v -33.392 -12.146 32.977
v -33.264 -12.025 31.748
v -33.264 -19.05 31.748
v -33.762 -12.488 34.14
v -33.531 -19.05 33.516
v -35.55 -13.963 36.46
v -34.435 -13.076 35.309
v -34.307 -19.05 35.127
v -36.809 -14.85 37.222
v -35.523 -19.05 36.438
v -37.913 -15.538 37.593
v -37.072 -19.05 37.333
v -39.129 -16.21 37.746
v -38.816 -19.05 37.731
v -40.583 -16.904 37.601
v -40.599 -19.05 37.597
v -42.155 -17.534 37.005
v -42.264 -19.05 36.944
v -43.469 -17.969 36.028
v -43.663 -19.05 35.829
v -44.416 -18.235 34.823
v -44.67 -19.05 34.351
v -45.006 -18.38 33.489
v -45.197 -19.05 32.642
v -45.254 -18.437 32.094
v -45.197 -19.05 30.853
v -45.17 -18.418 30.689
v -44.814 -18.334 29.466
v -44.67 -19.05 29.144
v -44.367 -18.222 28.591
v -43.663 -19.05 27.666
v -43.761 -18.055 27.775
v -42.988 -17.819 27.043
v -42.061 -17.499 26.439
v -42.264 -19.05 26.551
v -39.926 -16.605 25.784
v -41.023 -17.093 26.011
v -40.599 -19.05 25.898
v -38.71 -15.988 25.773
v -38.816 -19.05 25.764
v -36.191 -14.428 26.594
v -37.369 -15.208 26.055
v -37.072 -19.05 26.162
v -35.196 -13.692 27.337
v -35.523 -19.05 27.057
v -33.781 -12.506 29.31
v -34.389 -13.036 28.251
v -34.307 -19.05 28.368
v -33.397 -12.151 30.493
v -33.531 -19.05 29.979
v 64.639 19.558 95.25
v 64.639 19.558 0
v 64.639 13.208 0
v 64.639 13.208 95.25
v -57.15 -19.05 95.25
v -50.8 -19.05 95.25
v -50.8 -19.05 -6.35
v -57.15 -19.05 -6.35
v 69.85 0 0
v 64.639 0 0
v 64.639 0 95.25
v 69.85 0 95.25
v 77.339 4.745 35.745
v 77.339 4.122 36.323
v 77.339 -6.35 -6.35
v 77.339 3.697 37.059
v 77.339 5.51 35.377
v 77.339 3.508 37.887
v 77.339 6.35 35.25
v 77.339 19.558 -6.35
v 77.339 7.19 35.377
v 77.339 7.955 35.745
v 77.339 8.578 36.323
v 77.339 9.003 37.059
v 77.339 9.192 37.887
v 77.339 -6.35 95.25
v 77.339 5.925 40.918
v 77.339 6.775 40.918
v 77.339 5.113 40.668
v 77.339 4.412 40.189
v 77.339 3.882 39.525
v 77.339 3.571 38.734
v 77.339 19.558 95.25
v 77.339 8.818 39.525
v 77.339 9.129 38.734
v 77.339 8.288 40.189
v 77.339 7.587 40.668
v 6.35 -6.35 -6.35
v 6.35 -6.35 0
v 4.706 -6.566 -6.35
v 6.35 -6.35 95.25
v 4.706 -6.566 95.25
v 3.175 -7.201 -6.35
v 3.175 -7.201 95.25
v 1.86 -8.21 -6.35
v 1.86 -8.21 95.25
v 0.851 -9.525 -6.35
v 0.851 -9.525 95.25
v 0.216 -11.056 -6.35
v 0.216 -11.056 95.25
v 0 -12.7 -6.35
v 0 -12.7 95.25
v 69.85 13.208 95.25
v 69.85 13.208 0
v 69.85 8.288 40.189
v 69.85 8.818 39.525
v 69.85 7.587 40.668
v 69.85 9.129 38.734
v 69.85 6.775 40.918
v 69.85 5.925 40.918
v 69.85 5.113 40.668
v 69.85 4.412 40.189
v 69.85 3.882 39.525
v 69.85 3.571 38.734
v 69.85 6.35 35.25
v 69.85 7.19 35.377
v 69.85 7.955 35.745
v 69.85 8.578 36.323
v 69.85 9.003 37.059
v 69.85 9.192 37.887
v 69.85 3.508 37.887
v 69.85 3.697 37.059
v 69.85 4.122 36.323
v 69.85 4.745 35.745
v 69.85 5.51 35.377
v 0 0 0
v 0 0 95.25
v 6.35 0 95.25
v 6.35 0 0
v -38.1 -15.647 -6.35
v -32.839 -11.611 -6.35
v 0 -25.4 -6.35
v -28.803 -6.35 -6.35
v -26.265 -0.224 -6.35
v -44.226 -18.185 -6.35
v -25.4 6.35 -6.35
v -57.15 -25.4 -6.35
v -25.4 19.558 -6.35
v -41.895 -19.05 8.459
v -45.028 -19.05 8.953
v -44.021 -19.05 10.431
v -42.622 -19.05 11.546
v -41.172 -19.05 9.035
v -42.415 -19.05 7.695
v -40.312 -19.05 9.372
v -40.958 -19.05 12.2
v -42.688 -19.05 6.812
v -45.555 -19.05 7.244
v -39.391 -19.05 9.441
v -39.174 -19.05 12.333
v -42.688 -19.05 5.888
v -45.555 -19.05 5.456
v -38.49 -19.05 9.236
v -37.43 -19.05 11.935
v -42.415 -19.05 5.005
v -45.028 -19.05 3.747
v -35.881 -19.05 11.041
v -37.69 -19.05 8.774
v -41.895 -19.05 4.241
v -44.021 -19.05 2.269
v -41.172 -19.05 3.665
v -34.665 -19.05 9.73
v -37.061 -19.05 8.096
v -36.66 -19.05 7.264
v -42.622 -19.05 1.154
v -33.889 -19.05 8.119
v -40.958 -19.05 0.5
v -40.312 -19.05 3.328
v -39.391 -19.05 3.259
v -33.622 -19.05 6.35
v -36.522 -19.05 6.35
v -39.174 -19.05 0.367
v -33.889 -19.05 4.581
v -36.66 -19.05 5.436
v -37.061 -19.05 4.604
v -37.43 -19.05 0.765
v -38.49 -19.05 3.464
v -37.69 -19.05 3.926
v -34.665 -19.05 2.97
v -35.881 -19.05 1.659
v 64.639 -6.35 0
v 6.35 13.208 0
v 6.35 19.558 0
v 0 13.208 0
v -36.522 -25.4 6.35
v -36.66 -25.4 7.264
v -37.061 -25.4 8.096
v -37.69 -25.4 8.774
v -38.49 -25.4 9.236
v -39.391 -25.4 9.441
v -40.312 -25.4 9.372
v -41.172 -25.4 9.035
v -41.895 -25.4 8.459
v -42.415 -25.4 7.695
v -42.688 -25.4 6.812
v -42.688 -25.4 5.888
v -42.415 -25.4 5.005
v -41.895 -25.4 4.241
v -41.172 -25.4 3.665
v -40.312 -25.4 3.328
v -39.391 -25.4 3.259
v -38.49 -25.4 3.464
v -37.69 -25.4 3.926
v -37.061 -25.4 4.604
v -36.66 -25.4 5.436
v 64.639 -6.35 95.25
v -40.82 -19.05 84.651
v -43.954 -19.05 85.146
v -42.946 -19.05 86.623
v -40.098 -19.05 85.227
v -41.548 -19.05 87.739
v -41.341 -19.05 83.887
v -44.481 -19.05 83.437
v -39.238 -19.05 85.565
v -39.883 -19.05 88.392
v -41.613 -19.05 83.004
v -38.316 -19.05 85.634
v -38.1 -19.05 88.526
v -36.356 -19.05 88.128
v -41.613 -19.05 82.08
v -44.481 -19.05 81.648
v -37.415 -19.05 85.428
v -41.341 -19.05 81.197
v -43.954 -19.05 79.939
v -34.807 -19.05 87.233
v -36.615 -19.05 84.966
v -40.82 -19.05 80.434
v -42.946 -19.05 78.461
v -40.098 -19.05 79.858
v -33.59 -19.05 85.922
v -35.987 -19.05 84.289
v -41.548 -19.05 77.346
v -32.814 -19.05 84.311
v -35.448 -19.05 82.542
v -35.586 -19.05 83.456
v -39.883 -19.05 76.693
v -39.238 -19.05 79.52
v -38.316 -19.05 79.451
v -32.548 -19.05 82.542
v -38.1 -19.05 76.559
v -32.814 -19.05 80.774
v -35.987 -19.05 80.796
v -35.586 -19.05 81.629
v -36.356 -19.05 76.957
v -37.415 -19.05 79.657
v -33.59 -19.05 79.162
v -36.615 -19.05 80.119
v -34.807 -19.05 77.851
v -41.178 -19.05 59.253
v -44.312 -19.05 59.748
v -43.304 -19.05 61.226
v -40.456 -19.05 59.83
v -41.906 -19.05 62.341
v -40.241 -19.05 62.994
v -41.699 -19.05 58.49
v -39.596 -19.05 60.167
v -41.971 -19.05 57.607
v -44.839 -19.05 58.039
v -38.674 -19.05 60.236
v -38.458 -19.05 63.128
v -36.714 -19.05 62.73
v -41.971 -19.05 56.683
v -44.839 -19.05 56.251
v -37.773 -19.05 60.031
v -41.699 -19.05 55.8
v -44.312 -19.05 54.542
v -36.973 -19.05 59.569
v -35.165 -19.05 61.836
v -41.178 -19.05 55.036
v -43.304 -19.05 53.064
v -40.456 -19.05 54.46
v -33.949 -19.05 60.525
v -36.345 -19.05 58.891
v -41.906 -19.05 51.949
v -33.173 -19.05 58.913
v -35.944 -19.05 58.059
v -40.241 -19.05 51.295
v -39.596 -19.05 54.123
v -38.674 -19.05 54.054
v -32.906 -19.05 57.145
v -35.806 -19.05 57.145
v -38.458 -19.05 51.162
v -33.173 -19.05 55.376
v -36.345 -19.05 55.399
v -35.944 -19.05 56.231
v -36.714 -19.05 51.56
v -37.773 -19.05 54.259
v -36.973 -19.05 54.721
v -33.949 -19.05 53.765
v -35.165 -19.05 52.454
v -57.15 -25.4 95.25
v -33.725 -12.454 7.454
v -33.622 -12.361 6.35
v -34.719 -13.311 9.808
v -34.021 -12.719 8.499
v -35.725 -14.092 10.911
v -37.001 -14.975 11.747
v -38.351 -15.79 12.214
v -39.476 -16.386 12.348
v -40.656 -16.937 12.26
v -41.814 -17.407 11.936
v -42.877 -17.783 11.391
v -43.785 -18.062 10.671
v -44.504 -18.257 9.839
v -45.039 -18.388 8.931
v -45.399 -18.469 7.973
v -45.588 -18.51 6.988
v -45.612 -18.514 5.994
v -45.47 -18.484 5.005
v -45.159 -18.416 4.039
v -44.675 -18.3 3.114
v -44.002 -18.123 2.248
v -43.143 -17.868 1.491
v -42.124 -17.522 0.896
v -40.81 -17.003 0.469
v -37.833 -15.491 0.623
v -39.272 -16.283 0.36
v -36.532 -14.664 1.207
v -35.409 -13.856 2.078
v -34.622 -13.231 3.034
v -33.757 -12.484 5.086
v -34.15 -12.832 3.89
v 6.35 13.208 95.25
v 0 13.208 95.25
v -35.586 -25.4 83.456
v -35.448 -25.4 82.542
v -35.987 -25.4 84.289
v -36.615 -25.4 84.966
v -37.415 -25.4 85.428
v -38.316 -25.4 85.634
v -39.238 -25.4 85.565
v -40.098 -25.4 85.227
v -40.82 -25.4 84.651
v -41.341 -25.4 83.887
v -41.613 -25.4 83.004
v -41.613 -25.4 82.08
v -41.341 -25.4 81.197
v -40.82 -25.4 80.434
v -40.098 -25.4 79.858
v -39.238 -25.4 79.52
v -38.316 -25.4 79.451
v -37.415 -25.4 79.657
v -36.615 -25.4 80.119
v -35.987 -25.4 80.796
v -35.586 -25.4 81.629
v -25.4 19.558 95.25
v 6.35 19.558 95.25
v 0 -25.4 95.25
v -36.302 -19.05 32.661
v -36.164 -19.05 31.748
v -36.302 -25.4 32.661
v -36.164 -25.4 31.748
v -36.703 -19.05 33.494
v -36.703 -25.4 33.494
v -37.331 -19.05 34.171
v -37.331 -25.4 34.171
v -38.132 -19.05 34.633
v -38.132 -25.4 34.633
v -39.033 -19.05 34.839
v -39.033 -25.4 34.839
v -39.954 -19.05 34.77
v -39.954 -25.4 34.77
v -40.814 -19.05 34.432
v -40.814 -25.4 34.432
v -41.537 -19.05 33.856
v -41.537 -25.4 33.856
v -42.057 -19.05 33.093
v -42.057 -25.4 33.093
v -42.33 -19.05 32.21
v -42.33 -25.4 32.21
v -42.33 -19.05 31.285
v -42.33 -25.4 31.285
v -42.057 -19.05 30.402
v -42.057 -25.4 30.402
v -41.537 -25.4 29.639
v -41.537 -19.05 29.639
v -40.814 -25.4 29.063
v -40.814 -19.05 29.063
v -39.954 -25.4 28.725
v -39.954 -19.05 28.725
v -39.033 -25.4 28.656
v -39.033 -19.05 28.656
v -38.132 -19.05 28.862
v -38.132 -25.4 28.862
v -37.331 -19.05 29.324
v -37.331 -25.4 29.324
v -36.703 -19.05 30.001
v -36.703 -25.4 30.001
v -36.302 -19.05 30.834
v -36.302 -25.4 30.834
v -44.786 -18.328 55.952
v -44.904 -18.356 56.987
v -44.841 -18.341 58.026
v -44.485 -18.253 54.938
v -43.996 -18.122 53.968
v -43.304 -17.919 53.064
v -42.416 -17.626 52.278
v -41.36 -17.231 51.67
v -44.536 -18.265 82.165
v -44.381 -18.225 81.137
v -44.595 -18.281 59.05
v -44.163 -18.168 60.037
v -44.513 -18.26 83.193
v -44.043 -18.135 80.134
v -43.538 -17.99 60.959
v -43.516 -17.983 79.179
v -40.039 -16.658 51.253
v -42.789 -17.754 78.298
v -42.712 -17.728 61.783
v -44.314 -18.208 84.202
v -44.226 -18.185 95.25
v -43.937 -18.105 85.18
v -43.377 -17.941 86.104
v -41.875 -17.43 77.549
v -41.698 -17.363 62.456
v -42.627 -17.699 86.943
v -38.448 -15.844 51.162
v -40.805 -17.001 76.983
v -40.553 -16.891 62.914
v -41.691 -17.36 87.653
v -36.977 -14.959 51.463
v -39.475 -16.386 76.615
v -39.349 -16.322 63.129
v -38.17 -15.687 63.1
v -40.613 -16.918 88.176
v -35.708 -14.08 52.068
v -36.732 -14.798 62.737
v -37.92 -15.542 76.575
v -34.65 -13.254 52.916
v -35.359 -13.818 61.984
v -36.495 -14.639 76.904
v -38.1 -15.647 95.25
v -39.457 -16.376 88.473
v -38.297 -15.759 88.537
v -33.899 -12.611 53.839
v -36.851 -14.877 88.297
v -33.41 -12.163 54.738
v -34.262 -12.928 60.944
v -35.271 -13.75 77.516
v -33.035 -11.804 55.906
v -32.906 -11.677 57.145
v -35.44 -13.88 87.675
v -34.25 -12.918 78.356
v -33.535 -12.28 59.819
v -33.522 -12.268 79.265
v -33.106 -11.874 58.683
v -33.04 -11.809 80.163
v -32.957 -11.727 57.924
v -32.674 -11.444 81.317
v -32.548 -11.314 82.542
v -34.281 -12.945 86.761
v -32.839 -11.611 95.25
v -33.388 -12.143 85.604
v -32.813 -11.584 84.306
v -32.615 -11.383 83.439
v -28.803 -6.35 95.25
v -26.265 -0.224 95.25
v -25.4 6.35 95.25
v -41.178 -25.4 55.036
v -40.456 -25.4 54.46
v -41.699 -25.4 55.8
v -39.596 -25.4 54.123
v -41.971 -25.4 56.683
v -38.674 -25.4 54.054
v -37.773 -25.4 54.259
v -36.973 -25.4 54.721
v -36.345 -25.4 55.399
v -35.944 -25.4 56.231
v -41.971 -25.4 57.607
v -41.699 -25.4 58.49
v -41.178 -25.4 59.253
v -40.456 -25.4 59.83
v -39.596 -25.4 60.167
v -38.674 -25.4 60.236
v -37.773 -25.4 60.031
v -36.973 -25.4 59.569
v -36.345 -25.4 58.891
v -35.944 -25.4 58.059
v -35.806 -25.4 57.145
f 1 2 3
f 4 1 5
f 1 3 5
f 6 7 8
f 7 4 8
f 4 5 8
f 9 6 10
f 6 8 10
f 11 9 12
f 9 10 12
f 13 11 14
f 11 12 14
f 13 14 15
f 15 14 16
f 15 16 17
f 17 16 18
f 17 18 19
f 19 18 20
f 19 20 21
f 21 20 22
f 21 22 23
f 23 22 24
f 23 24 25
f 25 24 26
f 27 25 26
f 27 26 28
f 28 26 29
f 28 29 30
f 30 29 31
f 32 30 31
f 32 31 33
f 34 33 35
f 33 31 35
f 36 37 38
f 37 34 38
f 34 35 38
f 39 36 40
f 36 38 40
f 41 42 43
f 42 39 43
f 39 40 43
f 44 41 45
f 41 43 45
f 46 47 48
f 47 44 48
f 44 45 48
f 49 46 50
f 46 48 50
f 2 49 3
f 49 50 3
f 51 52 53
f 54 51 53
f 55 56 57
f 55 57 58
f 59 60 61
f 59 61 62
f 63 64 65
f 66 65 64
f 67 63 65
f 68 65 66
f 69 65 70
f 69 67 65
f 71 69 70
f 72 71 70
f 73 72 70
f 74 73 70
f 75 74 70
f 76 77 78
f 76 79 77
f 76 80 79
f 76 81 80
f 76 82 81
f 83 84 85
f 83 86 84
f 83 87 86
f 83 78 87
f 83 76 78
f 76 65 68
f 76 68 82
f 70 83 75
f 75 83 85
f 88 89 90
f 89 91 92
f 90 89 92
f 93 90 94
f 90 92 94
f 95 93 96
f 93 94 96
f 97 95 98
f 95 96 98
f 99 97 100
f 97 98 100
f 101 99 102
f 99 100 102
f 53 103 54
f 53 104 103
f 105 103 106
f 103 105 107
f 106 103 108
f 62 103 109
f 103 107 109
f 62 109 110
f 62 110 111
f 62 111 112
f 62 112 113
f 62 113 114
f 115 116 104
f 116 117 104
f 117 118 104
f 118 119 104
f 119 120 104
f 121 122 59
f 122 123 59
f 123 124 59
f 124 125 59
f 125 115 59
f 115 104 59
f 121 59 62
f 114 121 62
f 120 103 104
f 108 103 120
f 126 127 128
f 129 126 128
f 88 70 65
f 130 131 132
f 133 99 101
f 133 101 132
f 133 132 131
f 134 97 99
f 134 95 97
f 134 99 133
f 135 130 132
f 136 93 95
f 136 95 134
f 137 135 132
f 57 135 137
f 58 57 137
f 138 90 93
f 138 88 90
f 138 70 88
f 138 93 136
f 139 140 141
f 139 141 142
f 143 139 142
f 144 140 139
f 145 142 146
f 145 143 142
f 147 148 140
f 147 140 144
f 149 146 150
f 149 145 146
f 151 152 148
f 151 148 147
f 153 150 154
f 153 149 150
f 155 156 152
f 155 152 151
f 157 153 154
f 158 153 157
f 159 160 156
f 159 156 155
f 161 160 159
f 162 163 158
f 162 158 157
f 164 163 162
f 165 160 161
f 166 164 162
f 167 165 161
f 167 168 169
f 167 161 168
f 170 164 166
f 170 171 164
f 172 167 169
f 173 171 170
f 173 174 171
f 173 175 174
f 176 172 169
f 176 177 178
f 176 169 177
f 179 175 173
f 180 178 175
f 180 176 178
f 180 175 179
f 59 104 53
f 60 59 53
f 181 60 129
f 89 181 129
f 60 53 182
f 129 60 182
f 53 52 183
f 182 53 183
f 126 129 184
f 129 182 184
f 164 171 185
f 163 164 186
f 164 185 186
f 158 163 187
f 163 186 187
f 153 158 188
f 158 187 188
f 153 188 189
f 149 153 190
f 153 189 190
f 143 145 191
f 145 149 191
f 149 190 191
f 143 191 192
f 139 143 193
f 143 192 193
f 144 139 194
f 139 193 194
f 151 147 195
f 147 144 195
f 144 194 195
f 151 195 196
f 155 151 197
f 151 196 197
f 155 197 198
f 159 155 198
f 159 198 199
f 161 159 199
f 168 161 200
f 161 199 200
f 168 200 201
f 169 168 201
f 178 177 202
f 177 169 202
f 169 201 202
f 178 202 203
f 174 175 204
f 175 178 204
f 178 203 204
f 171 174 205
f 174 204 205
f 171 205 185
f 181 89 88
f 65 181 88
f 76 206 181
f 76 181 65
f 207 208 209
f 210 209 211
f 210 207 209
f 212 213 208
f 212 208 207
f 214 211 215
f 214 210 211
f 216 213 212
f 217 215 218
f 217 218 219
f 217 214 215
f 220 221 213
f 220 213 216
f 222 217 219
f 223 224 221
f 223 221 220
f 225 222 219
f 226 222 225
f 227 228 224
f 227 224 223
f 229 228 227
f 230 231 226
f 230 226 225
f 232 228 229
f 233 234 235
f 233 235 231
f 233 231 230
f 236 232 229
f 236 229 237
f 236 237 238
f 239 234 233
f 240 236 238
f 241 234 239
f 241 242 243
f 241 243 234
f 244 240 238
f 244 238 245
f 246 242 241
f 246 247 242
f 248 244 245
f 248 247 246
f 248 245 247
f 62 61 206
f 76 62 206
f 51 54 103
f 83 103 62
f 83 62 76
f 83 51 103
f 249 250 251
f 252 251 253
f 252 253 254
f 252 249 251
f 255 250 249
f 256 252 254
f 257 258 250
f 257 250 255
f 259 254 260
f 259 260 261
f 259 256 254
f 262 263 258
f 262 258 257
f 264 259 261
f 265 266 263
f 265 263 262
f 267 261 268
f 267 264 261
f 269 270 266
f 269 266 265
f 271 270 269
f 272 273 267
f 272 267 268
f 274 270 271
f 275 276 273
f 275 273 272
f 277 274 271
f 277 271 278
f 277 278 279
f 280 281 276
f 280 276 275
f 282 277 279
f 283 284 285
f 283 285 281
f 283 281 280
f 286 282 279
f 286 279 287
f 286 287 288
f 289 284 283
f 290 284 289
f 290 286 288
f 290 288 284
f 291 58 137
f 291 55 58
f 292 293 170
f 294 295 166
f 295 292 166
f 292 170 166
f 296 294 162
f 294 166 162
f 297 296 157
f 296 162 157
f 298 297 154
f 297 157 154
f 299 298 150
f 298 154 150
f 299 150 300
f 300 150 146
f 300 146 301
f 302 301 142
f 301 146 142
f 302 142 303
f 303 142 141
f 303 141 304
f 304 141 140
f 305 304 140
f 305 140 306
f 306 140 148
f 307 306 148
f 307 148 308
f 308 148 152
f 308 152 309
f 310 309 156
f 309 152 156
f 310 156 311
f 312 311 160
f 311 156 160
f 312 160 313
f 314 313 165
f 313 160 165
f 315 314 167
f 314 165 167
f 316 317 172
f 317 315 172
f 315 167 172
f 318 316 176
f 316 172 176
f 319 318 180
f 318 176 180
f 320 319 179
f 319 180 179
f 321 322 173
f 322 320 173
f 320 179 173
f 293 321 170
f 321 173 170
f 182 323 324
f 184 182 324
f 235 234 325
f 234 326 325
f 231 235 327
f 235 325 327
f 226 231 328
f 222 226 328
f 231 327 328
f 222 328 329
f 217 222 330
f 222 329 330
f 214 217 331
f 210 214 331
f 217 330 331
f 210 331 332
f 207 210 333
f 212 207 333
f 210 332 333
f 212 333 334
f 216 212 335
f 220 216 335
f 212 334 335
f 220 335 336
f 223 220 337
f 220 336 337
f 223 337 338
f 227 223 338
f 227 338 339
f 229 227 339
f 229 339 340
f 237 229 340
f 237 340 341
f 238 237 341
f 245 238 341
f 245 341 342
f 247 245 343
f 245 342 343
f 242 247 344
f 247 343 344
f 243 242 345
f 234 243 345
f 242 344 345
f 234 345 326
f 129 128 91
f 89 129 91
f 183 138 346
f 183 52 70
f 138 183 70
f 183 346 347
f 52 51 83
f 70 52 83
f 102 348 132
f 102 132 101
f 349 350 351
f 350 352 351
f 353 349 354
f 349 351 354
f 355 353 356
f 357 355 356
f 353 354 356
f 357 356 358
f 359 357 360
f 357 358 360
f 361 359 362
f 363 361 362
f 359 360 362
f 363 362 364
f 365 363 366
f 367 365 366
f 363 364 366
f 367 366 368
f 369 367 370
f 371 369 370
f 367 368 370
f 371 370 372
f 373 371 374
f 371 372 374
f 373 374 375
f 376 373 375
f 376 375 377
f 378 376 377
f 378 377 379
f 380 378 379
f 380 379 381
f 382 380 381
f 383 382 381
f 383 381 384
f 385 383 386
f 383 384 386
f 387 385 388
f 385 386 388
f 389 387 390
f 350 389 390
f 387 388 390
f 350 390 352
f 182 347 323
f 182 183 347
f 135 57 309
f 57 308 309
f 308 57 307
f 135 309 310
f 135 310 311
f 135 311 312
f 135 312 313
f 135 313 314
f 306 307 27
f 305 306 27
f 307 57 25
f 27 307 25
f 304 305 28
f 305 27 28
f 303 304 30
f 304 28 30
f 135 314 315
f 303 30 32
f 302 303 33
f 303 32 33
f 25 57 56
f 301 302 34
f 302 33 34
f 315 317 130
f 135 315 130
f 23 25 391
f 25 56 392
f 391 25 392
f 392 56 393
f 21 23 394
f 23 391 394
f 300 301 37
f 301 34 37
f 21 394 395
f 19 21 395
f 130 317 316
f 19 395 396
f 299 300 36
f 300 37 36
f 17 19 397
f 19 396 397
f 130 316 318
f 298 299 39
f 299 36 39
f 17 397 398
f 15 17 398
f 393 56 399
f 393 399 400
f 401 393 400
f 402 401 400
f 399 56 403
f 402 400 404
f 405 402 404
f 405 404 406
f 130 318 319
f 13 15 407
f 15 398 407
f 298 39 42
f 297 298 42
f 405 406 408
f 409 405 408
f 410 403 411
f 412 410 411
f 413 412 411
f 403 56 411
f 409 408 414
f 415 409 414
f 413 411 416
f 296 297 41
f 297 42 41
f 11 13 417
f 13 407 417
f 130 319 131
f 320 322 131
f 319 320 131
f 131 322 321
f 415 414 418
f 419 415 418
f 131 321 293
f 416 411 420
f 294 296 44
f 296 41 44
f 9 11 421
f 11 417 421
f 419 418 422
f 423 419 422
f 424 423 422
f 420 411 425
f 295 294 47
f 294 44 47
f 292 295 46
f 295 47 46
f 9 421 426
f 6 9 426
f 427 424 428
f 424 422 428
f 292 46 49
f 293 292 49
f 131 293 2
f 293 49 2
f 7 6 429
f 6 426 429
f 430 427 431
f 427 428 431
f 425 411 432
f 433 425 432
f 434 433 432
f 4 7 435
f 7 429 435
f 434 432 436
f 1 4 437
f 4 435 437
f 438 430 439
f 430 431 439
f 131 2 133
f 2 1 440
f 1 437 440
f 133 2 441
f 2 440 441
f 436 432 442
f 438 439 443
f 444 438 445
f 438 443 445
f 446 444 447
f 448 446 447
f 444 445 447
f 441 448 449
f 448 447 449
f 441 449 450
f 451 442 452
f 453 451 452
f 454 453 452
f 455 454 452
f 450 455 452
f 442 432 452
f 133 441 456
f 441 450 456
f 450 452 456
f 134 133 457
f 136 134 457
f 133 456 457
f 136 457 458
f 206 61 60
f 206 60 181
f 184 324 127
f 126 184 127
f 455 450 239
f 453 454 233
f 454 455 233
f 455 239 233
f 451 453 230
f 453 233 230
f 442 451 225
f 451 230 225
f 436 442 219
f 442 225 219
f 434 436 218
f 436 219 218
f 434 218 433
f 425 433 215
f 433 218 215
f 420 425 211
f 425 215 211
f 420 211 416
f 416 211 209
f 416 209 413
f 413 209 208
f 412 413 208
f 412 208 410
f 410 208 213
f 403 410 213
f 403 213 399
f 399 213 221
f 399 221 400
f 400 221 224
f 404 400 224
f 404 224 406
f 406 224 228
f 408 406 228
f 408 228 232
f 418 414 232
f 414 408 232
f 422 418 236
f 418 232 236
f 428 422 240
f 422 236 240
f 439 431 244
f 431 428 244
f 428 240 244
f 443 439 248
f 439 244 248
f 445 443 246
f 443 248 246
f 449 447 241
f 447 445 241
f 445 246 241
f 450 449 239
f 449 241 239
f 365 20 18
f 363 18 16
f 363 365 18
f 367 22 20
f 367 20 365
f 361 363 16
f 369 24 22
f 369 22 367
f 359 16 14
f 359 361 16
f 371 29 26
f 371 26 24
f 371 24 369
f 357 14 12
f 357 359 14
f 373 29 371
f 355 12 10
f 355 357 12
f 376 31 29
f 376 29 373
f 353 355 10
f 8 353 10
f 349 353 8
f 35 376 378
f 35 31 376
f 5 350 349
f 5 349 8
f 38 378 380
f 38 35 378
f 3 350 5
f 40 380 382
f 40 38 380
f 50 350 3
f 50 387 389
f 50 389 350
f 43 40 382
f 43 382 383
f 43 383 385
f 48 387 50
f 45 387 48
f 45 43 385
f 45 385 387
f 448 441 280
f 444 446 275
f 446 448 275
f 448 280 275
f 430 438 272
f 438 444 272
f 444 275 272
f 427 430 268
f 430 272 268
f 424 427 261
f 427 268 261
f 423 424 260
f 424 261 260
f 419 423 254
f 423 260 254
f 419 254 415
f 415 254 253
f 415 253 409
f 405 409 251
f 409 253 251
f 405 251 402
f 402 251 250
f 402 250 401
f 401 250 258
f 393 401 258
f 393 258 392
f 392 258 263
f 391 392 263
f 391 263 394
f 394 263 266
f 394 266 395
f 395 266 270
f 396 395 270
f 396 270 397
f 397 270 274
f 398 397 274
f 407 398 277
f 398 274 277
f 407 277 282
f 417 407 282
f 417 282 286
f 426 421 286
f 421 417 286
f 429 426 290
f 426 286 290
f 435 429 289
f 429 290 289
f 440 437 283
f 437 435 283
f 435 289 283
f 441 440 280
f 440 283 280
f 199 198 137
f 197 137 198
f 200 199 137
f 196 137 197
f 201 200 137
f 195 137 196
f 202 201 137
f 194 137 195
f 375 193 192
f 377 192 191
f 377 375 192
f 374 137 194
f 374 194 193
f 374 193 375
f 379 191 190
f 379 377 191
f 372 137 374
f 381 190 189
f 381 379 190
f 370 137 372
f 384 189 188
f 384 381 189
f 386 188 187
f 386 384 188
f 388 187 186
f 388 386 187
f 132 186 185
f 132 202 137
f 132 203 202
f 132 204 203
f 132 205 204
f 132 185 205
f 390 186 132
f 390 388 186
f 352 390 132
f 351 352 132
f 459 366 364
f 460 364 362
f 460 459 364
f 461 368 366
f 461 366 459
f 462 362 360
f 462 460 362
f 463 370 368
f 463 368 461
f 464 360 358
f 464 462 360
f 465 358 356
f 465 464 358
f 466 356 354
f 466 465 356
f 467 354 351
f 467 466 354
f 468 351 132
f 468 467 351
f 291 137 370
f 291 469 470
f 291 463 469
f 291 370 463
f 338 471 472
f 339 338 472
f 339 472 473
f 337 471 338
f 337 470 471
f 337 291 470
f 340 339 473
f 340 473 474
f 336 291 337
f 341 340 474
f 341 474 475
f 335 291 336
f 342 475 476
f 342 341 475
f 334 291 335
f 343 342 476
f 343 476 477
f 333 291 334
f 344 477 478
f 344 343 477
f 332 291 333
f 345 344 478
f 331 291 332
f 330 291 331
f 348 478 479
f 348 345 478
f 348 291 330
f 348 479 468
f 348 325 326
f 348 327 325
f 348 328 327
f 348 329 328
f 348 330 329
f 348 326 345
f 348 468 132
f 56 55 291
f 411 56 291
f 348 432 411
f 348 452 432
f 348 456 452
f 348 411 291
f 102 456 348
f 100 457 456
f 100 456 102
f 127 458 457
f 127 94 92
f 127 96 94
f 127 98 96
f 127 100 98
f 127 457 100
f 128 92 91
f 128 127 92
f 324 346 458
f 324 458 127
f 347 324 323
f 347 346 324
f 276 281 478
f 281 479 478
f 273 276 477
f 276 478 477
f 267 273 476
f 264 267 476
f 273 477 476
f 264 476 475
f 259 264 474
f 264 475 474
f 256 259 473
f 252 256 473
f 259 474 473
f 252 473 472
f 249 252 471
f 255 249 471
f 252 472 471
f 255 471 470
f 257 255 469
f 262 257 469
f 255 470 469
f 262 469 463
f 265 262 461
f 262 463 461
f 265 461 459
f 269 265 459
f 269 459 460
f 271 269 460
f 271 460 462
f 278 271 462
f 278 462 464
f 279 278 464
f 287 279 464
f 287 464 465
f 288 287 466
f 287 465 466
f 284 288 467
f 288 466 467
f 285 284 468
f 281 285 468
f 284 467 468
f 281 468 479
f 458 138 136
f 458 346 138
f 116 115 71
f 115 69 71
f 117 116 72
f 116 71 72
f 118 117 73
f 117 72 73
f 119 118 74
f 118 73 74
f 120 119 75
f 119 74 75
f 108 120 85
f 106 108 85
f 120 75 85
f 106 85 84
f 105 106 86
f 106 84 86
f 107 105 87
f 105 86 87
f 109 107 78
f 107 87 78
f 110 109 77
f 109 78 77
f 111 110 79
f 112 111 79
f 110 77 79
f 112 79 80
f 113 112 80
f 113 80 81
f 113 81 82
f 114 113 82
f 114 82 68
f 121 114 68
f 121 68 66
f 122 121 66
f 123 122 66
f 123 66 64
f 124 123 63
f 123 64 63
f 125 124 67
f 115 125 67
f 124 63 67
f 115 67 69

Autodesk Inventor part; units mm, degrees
ref_plane "YZ Plane" through (0, 0, 0) normal (1, 0, 0) x (0, 1, 0)
ref_plane "XZ Plane" through (0, 0, 0) normal (0, 1, 0) x (-1, 0, 0)
ref_plane "XY Plane" through (0, 0, 0) normal (0, 0, 1) x (1, 0, 0)
sketch "Sketch1" plane through (0, 0, 0) normal (0, 0, 1) x (1, 0, 0)
  line L0 (77.3388, 19.558) -> (77.3388, -6.35)
  line L1 (-6.35, -6.35) -> (-6.35, 19.558)
  line L2 (6.35, 19.558) -> (6.35, 13.208)
  line L3 (0, 13.208) -> (0, 0)
  line L4 (6.35, 0) -> (6.35, -6.35)
  line L5 (69.85, 13.208) -> (69.85, 0)
  line L6 (64.6388, 19.558) -> (64.6388, 13.208)
  line L7 (64.6388, 0) -> (64.6388, -6.35)
  line L8 (-6.35, 19.558) -> (6.35, 19.558)
  line L9 (64.6388, 19.558) -> (77.3388, 19.558)
  line L10 (69.85, 13.208) -> (64.6388, 13.208)
  line L11 (6.35, 13.208) -> (0, 13.208)
  line L12 (0, 0) -> (6.35, 0)
  line L13 (64.6388, 0) -> (69.85, 0)
  line L14 (77.3388, -6.35) -> (64.6388, -6.35)
  line L15 (6.35, -6.35) -> (-6.35, -6.35)
  dimension "d0" = 69.85
  dimension "d1" = 13.208
  dimension "d3" = 12.7
  dimension "d4" = 12.7
extrude "Extrusion1" add sketch "Sketch1" along normal blind 114.3
sketch "Sketch2" plane through (0, 0, 0) normal (0, 0, -1) x (-1, 0, 0)
  line L0 (-77.3388, 19.558) -> (-64.6388, 19.558) projected
  line L1 (6.35, -6.35) -> (-77.3388, -6.35)
  line L2 (-77.3388, -6.35) -> (-77.3388, 19.558)
  line L3 (-77.3388, 19.558) -> (6.35, 19.558)
  line L4 (6.35, 19.558) -> (25.4, 19.558)
  line L5 (25.4, 19.558) -> (25.4, -6.35)
  line L6 (25.4, -6.35) -> (6.35, -6.35)
  point P0 (0, 0)
  dimension "d46" = 19.05
extrude "Extrusion2" add sketch "Sketch2" along normal blind 6.35
sketch "Sketch3" plane through (0, 0, 114.3) normal (0, 0, 1) x (1, 0, 0)
  line L0 (-25.4, 19.558) -> (77.3388, 19.558) projected
  line L1 (0, 19.558) -> (-6.35, 19.558)
  line L2 (-57.15, -19.05) -> (-57.15, -25.4)
  line L3 (-57.15, -25.4) -> (0, -25.4)
  line L4 (0, -25.4) -> (0, 19.558)
  line L5 (-6.35, 19.558) -> (-6.35, 6.35)
  line L6 (6.35, 0) -> (0, 0) projected
  line L7 (-6.35, 19.558) -> (-25.4, 19.558)
  line L8 (-25.4, 19.558) -> (-25.4, 6.35)
  line L9 (-50.8, -19.05) -> (-57.15, -19.05)
  arc A0 (-50.8, -19.05) -> (-25.4, 6.35) centre (-50.8, 6.35) ccw
  point P0 (-6.35, -6.35)
  point P1 (-6.35, -19.05)
  dimension "d9" = 57.15
  dimension "d11" = 12.7
  dimension "d40" = 25.4
  dimension "d47" = 25.4
extrude "Extrusion3" add sketch "Sketch3" against normal up to surface (120.65 mm away)
sketch "Sketch4" plane through (-57.15, -25.4, 114.3) normal (0, -1, 0) x (1, 0, 0)
  line L0 (6.35, 0) -> (31.75, 0) construction
  line L1 (19.05, 0) -> (17.3485, -120.65) construction
  line L2 (6.35, -120.65) -> (6.35, -120.65) construction
  circle A0 centre (17.5276, -107.95) radius 3.1
  circle A1 centre (17.8858, -82.5525) radius 3.1
  circle A2 centre (18.244, -57.1551) radius 3.1
  circle A3 centre (18.6021, -31.7576) radius 3.1
  point P0 (57.15, -114.3)
  point P1 (28.347, -120.65)
  dimension "d16" = 6.2
  dimension "d17" = 12.7
  dimension "d20" = 25.4
extrude "Extrusion4" cut sketch "Sketch4" against normal blind 101.6
sketch "Sketch5" plane through (-6.35, 19.558, 114.3) normal (0, 1, 0) x (1, 0, 0)
  circle A0 centre (-33.2724, 107.95) radius 3.1 projected
  circle A1 centre (-33.2724, 107.95) radius 6.5
  line L0 (-33.2724, 107.95) -> (-33.2724, 95.4747) construction
  circle A2 centre (-33.2724, 82.55) radius 6.5
  circle A3 centre (-33.2724, 57.15) radius 6.5
  circle A4 centre (-33.2724, 31.75) radius 6.5
  point P0 (6.35, 114.3)
  dimension "d27" = 13
  dimension "d30" = 25.4
extrude "Extrusion5" [suppressed]
fillet "Fillet1" radius 6.35 1 edges at (0, -6.35, 53.975)
sketch "Sketch6" plane through (0, 0, 114.3) normal (0, 0, 1) x (1, 0, 0)
  line L0 (-57.15, -19.05) -> (-57.15, -25.4) projected
  line L1 (77.3388, 19.558) -> (64.6388, 19.558) projected
  line L2 (-57.15, -25.4) -> (77.3388, -25.4)
  line L3 (77.3388, -25.4) -> (77.3388, 19.558)
  line L4 (77.3388, 19.558) -> (-57.15, 19.558)
  line L5 (-57.15, 19.558) -> (-57.15, -25.4)
  point P0 (0, 0)
extrude "Extrusion6" cut sketch "Sketch6" against normal blind 19.05
sketch "Sketch7" plane through (77.3388, -6.35, -6.35) normal (1, 0, 0) x (0, 0, -1)
  circle A0 centre (-44.45, 12.7) radius 2.85
  line L0 (0, 25.908) -> (0, 0) projected
  line L1 (0, 0) -> (-101.6, 0) projected
  point P0 (-6.35, 6.35)
  dimension "d41" = 5.7
  dimension "d42" = 44.45
  dimension "d43" = 12.7
extrude "Extrusion7" cut sketch "Sketch7" against normal blind 25.4
sketch "Sketch8" plane through (-57.15, -19.05, -6.35) normal (0, 1, 0) x (1, 0, 0)
  line L0 (6.35, 0) -> (0, 0) construction
  line L1 (0, 0) -> (0, -14.734) construction
  line L2 (0, -101.6) -> (0, 0) construction
  circle A0 centre (17.5276, -12.7) radius 3.1 projected
  circle A1 centre (17.5276, -12.7) radius 6
  circle A2 centre (17.8858, -38.0975) radius 3.1 construction
  line L3 (17.5276, -12.7) -> (17.8858, -38.0975) construction
  circle A3 centre (17.8858, -38.0975) radius 6
  circle A4 centre (18.244, -63.4949) radius 6
  circle A5 centre (18.6021, -88.8924) radius 6
  point P0 (57.15, -6.35)
  dimension "d48" = 12
  dimension "d51" = 25.4
extrude "Extrusion8" cut sketch "Sketch8" along normal blind 25.4
properties part number "batterybracket"
